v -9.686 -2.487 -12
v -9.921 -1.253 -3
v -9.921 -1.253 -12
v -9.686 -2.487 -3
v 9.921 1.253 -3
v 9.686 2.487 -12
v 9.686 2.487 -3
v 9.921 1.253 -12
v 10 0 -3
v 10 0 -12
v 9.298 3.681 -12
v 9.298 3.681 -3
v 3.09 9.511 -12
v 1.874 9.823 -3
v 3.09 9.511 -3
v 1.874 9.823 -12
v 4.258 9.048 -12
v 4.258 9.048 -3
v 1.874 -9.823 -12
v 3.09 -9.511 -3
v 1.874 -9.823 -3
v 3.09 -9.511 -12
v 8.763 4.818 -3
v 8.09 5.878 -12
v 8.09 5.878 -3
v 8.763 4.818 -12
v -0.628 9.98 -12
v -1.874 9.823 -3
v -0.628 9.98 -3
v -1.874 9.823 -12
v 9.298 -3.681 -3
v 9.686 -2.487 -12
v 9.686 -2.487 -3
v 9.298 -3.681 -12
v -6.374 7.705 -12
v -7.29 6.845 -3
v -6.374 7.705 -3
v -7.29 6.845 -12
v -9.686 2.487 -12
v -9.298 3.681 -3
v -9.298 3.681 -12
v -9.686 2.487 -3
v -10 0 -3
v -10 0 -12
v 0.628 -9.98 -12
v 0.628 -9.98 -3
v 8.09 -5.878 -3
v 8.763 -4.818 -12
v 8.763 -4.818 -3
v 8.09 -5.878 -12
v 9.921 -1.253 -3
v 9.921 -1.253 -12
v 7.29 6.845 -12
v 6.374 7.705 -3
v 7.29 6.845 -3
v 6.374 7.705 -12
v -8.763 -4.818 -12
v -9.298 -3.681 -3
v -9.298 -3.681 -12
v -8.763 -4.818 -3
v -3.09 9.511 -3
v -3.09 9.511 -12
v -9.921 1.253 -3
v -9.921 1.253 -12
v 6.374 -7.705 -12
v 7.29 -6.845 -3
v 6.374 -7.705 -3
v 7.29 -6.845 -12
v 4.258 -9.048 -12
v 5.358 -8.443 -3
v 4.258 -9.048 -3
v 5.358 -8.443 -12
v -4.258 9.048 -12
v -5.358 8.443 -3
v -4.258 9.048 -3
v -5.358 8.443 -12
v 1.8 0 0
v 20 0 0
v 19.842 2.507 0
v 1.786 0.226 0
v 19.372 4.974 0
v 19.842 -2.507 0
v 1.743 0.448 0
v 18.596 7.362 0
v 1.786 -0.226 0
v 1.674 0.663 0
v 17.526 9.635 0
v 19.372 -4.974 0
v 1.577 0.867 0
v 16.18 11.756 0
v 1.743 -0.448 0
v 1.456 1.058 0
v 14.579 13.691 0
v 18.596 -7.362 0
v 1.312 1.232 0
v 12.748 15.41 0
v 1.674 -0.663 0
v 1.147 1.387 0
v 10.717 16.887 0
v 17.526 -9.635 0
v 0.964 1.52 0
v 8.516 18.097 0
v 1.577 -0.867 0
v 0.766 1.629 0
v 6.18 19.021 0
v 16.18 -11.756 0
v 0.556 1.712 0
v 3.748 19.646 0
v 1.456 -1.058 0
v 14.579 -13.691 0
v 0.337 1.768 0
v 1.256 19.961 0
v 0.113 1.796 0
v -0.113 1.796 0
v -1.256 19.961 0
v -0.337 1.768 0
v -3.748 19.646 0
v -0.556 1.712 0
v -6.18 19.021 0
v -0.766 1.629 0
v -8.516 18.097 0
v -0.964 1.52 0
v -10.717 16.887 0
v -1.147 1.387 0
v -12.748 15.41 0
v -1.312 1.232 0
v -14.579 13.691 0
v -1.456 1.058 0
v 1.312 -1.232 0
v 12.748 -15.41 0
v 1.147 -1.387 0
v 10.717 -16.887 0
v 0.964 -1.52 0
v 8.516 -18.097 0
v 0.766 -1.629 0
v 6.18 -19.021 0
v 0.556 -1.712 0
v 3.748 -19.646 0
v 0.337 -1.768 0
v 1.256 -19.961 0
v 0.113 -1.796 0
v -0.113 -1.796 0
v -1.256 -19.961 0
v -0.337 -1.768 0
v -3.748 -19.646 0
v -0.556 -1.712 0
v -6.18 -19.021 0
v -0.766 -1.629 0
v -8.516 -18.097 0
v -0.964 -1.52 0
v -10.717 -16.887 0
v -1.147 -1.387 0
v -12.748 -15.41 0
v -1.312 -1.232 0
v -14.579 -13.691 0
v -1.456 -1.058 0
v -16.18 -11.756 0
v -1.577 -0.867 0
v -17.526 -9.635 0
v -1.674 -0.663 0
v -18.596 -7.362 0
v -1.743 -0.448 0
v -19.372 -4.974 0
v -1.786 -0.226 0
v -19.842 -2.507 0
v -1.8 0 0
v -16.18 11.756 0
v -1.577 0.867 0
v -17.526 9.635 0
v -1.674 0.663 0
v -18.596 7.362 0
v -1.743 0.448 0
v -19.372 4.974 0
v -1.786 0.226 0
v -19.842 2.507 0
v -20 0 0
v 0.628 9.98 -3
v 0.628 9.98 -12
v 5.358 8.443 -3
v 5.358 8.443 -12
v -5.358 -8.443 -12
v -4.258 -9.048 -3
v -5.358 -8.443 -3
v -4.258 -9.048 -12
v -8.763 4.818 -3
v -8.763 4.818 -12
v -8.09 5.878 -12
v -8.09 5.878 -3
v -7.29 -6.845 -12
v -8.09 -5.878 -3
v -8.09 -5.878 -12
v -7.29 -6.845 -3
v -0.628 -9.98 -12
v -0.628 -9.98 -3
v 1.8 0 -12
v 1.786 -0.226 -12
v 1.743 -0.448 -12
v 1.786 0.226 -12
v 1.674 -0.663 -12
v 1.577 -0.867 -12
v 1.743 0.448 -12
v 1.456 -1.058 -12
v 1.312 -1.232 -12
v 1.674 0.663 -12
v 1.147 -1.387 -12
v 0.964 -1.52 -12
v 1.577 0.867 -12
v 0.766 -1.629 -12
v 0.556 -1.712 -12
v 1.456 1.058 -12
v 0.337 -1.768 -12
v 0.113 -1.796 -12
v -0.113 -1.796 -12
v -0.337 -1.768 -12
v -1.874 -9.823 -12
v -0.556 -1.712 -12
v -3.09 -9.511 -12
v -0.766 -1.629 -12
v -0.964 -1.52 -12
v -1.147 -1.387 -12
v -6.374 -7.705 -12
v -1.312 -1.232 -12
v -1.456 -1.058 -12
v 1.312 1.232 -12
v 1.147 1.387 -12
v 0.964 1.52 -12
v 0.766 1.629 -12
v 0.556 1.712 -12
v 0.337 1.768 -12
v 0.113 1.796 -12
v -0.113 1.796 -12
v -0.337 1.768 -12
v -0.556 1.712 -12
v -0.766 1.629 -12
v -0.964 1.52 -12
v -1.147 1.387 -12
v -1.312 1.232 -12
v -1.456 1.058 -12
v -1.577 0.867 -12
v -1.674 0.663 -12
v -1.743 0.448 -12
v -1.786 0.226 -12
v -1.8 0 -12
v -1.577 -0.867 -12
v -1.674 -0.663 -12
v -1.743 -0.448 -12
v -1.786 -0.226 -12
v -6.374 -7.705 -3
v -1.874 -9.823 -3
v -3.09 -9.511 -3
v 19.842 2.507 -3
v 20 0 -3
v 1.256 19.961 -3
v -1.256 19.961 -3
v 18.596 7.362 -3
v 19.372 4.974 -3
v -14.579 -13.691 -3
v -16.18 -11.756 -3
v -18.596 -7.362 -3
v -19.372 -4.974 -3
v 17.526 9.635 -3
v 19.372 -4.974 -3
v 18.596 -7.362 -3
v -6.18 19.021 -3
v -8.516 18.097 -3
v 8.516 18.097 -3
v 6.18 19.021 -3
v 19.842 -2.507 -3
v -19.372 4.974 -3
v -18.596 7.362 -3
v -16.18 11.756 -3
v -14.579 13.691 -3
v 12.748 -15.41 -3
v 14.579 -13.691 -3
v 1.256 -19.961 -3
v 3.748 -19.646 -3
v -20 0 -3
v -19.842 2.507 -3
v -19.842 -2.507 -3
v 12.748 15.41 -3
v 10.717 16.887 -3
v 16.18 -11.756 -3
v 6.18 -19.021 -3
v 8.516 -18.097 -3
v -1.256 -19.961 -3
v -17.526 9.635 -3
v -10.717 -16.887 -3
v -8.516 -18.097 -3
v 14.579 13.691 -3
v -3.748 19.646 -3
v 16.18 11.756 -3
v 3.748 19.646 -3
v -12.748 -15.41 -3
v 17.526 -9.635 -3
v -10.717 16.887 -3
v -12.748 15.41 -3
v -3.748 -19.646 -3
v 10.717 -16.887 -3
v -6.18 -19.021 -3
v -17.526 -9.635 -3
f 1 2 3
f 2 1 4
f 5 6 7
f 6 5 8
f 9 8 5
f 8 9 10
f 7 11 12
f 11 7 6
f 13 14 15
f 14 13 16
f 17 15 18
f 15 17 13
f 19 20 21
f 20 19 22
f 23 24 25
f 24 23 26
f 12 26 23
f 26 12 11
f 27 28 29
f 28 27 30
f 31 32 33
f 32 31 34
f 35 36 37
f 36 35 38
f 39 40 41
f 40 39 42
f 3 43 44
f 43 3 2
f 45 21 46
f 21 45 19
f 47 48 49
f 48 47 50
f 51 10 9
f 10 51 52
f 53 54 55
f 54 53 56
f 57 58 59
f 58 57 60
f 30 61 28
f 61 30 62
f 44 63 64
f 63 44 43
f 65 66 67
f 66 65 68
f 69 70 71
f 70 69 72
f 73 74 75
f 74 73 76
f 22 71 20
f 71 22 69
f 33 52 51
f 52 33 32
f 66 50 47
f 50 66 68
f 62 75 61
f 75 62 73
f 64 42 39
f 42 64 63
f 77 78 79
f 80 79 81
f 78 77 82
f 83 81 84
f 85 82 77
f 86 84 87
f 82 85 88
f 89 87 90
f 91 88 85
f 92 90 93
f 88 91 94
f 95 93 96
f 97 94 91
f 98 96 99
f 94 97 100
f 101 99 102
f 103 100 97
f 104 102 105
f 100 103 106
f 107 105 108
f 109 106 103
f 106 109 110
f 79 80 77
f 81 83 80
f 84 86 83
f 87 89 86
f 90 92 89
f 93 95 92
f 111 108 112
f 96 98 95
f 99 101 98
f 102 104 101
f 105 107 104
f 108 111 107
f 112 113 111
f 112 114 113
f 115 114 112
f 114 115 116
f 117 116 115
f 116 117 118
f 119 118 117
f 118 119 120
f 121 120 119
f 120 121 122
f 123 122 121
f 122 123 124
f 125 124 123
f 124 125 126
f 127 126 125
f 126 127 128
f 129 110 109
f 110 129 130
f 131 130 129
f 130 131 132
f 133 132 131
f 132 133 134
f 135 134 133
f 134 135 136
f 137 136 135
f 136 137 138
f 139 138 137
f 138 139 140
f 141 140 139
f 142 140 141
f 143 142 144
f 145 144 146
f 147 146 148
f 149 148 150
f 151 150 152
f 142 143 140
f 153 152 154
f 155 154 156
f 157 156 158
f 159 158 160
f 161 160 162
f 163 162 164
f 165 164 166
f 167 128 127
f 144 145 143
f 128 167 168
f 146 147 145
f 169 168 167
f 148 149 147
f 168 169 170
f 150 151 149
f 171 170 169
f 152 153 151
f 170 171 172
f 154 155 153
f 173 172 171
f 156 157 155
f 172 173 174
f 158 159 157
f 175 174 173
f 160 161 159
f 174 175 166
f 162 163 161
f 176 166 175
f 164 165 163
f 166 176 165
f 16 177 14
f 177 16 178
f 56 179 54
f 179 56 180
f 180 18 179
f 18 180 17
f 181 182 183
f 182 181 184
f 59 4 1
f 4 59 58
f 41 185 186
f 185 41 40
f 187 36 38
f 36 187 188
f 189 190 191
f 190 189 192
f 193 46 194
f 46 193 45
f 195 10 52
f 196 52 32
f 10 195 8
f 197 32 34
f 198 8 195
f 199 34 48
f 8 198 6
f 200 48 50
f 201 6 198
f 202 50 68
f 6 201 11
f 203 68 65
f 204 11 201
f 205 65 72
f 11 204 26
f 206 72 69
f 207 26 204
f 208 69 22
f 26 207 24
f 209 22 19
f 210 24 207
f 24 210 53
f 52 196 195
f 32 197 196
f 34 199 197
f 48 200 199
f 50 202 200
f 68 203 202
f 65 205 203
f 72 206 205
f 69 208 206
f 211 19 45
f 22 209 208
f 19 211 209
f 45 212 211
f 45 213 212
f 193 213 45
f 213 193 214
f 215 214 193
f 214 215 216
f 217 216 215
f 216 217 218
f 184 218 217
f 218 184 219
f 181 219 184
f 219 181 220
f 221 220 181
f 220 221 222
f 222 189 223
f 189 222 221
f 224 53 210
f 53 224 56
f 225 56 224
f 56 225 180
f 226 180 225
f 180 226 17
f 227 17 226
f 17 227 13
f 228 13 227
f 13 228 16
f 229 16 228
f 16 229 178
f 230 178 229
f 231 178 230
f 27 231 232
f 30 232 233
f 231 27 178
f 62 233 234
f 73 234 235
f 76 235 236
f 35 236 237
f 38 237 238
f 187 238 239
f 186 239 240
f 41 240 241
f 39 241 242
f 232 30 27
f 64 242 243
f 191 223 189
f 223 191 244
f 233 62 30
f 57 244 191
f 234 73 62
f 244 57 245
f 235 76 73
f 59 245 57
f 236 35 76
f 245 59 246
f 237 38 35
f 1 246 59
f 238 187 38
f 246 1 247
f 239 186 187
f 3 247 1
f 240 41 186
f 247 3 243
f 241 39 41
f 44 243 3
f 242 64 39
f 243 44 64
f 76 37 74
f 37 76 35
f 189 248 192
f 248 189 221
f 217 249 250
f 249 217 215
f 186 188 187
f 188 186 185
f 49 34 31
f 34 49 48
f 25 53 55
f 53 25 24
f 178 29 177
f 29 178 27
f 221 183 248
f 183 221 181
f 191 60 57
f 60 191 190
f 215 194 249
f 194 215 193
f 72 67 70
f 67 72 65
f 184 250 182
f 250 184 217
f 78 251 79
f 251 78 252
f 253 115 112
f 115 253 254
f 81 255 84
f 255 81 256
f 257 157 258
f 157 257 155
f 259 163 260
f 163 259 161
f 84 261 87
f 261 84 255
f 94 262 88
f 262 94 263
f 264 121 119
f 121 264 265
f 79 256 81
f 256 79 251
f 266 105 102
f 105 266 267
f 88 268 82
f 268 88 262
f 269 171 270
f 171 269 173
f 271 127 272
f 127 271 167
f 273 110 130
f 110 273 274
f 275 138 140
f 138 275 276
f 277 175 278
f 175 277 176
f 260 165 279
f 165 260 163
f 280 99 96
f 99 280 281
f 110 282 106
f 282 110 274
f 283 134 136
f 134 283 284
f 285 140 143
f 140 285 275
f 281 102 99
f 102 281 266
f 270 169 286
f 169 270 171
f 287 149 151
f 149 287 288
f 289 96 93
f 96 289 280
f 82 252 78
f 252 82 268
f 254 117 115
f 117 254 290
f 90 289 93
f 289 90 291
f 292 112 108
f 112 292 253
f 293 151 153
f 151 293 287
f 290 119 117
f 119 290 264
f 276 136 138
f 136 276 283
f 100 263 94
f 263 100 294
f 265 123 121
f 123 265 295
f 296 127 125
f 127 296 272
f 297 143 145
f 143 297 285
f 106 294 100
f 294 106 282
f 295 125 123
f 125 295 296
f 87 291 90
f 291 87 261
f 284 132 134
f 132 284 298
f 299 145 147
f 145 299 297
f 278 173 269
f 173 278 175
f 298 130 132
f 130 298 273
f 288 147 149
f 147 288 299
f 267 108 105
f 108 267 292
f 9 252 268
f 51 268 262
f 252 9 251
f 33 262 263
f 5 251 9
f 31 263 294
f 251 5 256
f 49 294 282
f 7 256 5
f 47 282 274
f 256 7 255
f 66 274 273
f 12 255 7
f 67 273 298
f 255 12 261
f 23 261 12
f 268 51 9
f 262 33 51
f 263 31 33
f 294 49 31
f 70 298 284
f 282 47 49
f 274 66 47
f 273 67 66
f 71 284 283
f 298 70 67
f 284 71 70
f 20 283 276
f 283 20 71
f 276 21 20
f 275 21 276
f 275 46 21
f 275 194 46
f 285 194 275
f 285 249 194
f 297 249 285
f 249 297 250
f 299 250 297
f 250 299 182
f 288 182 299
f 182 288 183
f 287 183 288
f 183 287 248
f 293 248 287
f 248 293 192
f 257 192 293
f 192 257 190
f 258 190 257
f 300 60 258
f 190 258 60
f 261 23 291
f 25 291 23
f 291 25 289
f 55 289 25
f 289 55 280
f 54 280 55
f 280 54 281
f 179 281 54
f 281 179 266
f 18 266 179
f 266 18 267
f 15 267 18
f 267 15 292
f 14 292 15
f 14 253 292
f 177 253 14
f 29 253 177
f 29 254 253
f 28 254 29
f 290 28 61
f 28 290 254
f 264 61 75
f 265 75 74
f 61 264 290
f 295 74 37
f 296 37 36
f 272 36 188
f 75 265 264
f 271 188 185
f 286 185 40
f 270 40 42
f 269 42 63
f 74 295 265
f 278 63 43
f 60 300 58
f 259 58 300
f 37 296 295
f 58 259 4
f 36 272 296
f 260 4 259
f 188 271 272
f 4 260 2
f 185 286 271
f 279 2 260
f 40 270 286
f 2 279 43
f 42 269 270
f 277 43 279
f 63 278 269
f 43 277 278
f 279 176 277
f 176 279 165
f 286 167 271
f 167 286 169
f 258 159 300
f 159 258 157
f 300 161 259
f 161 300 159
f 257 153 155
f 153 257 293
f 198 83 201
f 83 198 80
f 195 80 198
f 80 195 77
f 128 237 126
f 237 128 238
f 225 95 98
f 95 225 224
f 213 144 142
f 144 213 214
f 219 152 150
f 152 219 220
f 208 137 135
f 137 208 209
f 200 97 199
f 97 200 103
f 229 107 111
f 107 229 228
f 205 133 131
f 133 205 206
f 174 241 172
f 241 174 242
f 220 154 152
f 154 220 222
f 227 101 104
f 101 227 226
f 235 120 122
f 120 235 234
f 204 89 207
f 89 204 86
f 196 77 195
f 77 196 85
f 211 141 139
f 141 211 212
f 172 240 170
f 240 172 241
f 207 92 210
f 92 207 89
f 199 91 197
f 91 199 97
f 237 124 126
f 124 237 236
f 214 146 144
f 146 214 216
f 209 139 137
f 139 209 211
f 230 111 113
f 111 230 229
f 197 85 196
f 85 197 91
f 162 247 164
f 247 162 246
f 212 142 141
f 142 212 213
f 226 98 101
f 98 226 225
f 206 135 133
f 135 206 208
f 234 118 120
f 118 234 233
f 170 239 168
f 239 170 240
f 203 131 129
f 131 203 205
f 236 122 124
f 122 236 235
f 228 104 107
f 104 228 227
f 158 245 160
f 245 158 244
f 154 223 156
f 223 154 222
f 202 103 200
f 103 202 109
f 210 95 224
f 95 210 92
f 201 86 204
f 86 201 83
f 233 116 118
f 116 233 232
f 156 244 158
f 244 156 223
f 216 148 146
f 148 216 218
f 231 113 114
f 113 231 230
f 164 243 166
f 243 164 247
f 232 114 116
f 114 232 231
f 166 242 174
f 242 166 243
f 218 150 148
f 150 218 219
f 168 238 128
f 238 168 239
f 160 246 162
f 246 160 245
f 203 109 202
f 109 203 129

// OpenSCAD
$fn = 50;


difference() {
	union() {
		translate(v = [0, 0, -12.0000000000]) {
			cylinder(h = 12, r = 10.0000000000);
		}
		translate(v = [0, 0, -3.0000000000]) {
			cylinder(h = 3, r = 20.0000000000);
		}
	}
	union() {
		#translate(v = [0, 0, -12]) {
			cylinder(h = 12, r = 1.8000000000);
		}
	}
}
